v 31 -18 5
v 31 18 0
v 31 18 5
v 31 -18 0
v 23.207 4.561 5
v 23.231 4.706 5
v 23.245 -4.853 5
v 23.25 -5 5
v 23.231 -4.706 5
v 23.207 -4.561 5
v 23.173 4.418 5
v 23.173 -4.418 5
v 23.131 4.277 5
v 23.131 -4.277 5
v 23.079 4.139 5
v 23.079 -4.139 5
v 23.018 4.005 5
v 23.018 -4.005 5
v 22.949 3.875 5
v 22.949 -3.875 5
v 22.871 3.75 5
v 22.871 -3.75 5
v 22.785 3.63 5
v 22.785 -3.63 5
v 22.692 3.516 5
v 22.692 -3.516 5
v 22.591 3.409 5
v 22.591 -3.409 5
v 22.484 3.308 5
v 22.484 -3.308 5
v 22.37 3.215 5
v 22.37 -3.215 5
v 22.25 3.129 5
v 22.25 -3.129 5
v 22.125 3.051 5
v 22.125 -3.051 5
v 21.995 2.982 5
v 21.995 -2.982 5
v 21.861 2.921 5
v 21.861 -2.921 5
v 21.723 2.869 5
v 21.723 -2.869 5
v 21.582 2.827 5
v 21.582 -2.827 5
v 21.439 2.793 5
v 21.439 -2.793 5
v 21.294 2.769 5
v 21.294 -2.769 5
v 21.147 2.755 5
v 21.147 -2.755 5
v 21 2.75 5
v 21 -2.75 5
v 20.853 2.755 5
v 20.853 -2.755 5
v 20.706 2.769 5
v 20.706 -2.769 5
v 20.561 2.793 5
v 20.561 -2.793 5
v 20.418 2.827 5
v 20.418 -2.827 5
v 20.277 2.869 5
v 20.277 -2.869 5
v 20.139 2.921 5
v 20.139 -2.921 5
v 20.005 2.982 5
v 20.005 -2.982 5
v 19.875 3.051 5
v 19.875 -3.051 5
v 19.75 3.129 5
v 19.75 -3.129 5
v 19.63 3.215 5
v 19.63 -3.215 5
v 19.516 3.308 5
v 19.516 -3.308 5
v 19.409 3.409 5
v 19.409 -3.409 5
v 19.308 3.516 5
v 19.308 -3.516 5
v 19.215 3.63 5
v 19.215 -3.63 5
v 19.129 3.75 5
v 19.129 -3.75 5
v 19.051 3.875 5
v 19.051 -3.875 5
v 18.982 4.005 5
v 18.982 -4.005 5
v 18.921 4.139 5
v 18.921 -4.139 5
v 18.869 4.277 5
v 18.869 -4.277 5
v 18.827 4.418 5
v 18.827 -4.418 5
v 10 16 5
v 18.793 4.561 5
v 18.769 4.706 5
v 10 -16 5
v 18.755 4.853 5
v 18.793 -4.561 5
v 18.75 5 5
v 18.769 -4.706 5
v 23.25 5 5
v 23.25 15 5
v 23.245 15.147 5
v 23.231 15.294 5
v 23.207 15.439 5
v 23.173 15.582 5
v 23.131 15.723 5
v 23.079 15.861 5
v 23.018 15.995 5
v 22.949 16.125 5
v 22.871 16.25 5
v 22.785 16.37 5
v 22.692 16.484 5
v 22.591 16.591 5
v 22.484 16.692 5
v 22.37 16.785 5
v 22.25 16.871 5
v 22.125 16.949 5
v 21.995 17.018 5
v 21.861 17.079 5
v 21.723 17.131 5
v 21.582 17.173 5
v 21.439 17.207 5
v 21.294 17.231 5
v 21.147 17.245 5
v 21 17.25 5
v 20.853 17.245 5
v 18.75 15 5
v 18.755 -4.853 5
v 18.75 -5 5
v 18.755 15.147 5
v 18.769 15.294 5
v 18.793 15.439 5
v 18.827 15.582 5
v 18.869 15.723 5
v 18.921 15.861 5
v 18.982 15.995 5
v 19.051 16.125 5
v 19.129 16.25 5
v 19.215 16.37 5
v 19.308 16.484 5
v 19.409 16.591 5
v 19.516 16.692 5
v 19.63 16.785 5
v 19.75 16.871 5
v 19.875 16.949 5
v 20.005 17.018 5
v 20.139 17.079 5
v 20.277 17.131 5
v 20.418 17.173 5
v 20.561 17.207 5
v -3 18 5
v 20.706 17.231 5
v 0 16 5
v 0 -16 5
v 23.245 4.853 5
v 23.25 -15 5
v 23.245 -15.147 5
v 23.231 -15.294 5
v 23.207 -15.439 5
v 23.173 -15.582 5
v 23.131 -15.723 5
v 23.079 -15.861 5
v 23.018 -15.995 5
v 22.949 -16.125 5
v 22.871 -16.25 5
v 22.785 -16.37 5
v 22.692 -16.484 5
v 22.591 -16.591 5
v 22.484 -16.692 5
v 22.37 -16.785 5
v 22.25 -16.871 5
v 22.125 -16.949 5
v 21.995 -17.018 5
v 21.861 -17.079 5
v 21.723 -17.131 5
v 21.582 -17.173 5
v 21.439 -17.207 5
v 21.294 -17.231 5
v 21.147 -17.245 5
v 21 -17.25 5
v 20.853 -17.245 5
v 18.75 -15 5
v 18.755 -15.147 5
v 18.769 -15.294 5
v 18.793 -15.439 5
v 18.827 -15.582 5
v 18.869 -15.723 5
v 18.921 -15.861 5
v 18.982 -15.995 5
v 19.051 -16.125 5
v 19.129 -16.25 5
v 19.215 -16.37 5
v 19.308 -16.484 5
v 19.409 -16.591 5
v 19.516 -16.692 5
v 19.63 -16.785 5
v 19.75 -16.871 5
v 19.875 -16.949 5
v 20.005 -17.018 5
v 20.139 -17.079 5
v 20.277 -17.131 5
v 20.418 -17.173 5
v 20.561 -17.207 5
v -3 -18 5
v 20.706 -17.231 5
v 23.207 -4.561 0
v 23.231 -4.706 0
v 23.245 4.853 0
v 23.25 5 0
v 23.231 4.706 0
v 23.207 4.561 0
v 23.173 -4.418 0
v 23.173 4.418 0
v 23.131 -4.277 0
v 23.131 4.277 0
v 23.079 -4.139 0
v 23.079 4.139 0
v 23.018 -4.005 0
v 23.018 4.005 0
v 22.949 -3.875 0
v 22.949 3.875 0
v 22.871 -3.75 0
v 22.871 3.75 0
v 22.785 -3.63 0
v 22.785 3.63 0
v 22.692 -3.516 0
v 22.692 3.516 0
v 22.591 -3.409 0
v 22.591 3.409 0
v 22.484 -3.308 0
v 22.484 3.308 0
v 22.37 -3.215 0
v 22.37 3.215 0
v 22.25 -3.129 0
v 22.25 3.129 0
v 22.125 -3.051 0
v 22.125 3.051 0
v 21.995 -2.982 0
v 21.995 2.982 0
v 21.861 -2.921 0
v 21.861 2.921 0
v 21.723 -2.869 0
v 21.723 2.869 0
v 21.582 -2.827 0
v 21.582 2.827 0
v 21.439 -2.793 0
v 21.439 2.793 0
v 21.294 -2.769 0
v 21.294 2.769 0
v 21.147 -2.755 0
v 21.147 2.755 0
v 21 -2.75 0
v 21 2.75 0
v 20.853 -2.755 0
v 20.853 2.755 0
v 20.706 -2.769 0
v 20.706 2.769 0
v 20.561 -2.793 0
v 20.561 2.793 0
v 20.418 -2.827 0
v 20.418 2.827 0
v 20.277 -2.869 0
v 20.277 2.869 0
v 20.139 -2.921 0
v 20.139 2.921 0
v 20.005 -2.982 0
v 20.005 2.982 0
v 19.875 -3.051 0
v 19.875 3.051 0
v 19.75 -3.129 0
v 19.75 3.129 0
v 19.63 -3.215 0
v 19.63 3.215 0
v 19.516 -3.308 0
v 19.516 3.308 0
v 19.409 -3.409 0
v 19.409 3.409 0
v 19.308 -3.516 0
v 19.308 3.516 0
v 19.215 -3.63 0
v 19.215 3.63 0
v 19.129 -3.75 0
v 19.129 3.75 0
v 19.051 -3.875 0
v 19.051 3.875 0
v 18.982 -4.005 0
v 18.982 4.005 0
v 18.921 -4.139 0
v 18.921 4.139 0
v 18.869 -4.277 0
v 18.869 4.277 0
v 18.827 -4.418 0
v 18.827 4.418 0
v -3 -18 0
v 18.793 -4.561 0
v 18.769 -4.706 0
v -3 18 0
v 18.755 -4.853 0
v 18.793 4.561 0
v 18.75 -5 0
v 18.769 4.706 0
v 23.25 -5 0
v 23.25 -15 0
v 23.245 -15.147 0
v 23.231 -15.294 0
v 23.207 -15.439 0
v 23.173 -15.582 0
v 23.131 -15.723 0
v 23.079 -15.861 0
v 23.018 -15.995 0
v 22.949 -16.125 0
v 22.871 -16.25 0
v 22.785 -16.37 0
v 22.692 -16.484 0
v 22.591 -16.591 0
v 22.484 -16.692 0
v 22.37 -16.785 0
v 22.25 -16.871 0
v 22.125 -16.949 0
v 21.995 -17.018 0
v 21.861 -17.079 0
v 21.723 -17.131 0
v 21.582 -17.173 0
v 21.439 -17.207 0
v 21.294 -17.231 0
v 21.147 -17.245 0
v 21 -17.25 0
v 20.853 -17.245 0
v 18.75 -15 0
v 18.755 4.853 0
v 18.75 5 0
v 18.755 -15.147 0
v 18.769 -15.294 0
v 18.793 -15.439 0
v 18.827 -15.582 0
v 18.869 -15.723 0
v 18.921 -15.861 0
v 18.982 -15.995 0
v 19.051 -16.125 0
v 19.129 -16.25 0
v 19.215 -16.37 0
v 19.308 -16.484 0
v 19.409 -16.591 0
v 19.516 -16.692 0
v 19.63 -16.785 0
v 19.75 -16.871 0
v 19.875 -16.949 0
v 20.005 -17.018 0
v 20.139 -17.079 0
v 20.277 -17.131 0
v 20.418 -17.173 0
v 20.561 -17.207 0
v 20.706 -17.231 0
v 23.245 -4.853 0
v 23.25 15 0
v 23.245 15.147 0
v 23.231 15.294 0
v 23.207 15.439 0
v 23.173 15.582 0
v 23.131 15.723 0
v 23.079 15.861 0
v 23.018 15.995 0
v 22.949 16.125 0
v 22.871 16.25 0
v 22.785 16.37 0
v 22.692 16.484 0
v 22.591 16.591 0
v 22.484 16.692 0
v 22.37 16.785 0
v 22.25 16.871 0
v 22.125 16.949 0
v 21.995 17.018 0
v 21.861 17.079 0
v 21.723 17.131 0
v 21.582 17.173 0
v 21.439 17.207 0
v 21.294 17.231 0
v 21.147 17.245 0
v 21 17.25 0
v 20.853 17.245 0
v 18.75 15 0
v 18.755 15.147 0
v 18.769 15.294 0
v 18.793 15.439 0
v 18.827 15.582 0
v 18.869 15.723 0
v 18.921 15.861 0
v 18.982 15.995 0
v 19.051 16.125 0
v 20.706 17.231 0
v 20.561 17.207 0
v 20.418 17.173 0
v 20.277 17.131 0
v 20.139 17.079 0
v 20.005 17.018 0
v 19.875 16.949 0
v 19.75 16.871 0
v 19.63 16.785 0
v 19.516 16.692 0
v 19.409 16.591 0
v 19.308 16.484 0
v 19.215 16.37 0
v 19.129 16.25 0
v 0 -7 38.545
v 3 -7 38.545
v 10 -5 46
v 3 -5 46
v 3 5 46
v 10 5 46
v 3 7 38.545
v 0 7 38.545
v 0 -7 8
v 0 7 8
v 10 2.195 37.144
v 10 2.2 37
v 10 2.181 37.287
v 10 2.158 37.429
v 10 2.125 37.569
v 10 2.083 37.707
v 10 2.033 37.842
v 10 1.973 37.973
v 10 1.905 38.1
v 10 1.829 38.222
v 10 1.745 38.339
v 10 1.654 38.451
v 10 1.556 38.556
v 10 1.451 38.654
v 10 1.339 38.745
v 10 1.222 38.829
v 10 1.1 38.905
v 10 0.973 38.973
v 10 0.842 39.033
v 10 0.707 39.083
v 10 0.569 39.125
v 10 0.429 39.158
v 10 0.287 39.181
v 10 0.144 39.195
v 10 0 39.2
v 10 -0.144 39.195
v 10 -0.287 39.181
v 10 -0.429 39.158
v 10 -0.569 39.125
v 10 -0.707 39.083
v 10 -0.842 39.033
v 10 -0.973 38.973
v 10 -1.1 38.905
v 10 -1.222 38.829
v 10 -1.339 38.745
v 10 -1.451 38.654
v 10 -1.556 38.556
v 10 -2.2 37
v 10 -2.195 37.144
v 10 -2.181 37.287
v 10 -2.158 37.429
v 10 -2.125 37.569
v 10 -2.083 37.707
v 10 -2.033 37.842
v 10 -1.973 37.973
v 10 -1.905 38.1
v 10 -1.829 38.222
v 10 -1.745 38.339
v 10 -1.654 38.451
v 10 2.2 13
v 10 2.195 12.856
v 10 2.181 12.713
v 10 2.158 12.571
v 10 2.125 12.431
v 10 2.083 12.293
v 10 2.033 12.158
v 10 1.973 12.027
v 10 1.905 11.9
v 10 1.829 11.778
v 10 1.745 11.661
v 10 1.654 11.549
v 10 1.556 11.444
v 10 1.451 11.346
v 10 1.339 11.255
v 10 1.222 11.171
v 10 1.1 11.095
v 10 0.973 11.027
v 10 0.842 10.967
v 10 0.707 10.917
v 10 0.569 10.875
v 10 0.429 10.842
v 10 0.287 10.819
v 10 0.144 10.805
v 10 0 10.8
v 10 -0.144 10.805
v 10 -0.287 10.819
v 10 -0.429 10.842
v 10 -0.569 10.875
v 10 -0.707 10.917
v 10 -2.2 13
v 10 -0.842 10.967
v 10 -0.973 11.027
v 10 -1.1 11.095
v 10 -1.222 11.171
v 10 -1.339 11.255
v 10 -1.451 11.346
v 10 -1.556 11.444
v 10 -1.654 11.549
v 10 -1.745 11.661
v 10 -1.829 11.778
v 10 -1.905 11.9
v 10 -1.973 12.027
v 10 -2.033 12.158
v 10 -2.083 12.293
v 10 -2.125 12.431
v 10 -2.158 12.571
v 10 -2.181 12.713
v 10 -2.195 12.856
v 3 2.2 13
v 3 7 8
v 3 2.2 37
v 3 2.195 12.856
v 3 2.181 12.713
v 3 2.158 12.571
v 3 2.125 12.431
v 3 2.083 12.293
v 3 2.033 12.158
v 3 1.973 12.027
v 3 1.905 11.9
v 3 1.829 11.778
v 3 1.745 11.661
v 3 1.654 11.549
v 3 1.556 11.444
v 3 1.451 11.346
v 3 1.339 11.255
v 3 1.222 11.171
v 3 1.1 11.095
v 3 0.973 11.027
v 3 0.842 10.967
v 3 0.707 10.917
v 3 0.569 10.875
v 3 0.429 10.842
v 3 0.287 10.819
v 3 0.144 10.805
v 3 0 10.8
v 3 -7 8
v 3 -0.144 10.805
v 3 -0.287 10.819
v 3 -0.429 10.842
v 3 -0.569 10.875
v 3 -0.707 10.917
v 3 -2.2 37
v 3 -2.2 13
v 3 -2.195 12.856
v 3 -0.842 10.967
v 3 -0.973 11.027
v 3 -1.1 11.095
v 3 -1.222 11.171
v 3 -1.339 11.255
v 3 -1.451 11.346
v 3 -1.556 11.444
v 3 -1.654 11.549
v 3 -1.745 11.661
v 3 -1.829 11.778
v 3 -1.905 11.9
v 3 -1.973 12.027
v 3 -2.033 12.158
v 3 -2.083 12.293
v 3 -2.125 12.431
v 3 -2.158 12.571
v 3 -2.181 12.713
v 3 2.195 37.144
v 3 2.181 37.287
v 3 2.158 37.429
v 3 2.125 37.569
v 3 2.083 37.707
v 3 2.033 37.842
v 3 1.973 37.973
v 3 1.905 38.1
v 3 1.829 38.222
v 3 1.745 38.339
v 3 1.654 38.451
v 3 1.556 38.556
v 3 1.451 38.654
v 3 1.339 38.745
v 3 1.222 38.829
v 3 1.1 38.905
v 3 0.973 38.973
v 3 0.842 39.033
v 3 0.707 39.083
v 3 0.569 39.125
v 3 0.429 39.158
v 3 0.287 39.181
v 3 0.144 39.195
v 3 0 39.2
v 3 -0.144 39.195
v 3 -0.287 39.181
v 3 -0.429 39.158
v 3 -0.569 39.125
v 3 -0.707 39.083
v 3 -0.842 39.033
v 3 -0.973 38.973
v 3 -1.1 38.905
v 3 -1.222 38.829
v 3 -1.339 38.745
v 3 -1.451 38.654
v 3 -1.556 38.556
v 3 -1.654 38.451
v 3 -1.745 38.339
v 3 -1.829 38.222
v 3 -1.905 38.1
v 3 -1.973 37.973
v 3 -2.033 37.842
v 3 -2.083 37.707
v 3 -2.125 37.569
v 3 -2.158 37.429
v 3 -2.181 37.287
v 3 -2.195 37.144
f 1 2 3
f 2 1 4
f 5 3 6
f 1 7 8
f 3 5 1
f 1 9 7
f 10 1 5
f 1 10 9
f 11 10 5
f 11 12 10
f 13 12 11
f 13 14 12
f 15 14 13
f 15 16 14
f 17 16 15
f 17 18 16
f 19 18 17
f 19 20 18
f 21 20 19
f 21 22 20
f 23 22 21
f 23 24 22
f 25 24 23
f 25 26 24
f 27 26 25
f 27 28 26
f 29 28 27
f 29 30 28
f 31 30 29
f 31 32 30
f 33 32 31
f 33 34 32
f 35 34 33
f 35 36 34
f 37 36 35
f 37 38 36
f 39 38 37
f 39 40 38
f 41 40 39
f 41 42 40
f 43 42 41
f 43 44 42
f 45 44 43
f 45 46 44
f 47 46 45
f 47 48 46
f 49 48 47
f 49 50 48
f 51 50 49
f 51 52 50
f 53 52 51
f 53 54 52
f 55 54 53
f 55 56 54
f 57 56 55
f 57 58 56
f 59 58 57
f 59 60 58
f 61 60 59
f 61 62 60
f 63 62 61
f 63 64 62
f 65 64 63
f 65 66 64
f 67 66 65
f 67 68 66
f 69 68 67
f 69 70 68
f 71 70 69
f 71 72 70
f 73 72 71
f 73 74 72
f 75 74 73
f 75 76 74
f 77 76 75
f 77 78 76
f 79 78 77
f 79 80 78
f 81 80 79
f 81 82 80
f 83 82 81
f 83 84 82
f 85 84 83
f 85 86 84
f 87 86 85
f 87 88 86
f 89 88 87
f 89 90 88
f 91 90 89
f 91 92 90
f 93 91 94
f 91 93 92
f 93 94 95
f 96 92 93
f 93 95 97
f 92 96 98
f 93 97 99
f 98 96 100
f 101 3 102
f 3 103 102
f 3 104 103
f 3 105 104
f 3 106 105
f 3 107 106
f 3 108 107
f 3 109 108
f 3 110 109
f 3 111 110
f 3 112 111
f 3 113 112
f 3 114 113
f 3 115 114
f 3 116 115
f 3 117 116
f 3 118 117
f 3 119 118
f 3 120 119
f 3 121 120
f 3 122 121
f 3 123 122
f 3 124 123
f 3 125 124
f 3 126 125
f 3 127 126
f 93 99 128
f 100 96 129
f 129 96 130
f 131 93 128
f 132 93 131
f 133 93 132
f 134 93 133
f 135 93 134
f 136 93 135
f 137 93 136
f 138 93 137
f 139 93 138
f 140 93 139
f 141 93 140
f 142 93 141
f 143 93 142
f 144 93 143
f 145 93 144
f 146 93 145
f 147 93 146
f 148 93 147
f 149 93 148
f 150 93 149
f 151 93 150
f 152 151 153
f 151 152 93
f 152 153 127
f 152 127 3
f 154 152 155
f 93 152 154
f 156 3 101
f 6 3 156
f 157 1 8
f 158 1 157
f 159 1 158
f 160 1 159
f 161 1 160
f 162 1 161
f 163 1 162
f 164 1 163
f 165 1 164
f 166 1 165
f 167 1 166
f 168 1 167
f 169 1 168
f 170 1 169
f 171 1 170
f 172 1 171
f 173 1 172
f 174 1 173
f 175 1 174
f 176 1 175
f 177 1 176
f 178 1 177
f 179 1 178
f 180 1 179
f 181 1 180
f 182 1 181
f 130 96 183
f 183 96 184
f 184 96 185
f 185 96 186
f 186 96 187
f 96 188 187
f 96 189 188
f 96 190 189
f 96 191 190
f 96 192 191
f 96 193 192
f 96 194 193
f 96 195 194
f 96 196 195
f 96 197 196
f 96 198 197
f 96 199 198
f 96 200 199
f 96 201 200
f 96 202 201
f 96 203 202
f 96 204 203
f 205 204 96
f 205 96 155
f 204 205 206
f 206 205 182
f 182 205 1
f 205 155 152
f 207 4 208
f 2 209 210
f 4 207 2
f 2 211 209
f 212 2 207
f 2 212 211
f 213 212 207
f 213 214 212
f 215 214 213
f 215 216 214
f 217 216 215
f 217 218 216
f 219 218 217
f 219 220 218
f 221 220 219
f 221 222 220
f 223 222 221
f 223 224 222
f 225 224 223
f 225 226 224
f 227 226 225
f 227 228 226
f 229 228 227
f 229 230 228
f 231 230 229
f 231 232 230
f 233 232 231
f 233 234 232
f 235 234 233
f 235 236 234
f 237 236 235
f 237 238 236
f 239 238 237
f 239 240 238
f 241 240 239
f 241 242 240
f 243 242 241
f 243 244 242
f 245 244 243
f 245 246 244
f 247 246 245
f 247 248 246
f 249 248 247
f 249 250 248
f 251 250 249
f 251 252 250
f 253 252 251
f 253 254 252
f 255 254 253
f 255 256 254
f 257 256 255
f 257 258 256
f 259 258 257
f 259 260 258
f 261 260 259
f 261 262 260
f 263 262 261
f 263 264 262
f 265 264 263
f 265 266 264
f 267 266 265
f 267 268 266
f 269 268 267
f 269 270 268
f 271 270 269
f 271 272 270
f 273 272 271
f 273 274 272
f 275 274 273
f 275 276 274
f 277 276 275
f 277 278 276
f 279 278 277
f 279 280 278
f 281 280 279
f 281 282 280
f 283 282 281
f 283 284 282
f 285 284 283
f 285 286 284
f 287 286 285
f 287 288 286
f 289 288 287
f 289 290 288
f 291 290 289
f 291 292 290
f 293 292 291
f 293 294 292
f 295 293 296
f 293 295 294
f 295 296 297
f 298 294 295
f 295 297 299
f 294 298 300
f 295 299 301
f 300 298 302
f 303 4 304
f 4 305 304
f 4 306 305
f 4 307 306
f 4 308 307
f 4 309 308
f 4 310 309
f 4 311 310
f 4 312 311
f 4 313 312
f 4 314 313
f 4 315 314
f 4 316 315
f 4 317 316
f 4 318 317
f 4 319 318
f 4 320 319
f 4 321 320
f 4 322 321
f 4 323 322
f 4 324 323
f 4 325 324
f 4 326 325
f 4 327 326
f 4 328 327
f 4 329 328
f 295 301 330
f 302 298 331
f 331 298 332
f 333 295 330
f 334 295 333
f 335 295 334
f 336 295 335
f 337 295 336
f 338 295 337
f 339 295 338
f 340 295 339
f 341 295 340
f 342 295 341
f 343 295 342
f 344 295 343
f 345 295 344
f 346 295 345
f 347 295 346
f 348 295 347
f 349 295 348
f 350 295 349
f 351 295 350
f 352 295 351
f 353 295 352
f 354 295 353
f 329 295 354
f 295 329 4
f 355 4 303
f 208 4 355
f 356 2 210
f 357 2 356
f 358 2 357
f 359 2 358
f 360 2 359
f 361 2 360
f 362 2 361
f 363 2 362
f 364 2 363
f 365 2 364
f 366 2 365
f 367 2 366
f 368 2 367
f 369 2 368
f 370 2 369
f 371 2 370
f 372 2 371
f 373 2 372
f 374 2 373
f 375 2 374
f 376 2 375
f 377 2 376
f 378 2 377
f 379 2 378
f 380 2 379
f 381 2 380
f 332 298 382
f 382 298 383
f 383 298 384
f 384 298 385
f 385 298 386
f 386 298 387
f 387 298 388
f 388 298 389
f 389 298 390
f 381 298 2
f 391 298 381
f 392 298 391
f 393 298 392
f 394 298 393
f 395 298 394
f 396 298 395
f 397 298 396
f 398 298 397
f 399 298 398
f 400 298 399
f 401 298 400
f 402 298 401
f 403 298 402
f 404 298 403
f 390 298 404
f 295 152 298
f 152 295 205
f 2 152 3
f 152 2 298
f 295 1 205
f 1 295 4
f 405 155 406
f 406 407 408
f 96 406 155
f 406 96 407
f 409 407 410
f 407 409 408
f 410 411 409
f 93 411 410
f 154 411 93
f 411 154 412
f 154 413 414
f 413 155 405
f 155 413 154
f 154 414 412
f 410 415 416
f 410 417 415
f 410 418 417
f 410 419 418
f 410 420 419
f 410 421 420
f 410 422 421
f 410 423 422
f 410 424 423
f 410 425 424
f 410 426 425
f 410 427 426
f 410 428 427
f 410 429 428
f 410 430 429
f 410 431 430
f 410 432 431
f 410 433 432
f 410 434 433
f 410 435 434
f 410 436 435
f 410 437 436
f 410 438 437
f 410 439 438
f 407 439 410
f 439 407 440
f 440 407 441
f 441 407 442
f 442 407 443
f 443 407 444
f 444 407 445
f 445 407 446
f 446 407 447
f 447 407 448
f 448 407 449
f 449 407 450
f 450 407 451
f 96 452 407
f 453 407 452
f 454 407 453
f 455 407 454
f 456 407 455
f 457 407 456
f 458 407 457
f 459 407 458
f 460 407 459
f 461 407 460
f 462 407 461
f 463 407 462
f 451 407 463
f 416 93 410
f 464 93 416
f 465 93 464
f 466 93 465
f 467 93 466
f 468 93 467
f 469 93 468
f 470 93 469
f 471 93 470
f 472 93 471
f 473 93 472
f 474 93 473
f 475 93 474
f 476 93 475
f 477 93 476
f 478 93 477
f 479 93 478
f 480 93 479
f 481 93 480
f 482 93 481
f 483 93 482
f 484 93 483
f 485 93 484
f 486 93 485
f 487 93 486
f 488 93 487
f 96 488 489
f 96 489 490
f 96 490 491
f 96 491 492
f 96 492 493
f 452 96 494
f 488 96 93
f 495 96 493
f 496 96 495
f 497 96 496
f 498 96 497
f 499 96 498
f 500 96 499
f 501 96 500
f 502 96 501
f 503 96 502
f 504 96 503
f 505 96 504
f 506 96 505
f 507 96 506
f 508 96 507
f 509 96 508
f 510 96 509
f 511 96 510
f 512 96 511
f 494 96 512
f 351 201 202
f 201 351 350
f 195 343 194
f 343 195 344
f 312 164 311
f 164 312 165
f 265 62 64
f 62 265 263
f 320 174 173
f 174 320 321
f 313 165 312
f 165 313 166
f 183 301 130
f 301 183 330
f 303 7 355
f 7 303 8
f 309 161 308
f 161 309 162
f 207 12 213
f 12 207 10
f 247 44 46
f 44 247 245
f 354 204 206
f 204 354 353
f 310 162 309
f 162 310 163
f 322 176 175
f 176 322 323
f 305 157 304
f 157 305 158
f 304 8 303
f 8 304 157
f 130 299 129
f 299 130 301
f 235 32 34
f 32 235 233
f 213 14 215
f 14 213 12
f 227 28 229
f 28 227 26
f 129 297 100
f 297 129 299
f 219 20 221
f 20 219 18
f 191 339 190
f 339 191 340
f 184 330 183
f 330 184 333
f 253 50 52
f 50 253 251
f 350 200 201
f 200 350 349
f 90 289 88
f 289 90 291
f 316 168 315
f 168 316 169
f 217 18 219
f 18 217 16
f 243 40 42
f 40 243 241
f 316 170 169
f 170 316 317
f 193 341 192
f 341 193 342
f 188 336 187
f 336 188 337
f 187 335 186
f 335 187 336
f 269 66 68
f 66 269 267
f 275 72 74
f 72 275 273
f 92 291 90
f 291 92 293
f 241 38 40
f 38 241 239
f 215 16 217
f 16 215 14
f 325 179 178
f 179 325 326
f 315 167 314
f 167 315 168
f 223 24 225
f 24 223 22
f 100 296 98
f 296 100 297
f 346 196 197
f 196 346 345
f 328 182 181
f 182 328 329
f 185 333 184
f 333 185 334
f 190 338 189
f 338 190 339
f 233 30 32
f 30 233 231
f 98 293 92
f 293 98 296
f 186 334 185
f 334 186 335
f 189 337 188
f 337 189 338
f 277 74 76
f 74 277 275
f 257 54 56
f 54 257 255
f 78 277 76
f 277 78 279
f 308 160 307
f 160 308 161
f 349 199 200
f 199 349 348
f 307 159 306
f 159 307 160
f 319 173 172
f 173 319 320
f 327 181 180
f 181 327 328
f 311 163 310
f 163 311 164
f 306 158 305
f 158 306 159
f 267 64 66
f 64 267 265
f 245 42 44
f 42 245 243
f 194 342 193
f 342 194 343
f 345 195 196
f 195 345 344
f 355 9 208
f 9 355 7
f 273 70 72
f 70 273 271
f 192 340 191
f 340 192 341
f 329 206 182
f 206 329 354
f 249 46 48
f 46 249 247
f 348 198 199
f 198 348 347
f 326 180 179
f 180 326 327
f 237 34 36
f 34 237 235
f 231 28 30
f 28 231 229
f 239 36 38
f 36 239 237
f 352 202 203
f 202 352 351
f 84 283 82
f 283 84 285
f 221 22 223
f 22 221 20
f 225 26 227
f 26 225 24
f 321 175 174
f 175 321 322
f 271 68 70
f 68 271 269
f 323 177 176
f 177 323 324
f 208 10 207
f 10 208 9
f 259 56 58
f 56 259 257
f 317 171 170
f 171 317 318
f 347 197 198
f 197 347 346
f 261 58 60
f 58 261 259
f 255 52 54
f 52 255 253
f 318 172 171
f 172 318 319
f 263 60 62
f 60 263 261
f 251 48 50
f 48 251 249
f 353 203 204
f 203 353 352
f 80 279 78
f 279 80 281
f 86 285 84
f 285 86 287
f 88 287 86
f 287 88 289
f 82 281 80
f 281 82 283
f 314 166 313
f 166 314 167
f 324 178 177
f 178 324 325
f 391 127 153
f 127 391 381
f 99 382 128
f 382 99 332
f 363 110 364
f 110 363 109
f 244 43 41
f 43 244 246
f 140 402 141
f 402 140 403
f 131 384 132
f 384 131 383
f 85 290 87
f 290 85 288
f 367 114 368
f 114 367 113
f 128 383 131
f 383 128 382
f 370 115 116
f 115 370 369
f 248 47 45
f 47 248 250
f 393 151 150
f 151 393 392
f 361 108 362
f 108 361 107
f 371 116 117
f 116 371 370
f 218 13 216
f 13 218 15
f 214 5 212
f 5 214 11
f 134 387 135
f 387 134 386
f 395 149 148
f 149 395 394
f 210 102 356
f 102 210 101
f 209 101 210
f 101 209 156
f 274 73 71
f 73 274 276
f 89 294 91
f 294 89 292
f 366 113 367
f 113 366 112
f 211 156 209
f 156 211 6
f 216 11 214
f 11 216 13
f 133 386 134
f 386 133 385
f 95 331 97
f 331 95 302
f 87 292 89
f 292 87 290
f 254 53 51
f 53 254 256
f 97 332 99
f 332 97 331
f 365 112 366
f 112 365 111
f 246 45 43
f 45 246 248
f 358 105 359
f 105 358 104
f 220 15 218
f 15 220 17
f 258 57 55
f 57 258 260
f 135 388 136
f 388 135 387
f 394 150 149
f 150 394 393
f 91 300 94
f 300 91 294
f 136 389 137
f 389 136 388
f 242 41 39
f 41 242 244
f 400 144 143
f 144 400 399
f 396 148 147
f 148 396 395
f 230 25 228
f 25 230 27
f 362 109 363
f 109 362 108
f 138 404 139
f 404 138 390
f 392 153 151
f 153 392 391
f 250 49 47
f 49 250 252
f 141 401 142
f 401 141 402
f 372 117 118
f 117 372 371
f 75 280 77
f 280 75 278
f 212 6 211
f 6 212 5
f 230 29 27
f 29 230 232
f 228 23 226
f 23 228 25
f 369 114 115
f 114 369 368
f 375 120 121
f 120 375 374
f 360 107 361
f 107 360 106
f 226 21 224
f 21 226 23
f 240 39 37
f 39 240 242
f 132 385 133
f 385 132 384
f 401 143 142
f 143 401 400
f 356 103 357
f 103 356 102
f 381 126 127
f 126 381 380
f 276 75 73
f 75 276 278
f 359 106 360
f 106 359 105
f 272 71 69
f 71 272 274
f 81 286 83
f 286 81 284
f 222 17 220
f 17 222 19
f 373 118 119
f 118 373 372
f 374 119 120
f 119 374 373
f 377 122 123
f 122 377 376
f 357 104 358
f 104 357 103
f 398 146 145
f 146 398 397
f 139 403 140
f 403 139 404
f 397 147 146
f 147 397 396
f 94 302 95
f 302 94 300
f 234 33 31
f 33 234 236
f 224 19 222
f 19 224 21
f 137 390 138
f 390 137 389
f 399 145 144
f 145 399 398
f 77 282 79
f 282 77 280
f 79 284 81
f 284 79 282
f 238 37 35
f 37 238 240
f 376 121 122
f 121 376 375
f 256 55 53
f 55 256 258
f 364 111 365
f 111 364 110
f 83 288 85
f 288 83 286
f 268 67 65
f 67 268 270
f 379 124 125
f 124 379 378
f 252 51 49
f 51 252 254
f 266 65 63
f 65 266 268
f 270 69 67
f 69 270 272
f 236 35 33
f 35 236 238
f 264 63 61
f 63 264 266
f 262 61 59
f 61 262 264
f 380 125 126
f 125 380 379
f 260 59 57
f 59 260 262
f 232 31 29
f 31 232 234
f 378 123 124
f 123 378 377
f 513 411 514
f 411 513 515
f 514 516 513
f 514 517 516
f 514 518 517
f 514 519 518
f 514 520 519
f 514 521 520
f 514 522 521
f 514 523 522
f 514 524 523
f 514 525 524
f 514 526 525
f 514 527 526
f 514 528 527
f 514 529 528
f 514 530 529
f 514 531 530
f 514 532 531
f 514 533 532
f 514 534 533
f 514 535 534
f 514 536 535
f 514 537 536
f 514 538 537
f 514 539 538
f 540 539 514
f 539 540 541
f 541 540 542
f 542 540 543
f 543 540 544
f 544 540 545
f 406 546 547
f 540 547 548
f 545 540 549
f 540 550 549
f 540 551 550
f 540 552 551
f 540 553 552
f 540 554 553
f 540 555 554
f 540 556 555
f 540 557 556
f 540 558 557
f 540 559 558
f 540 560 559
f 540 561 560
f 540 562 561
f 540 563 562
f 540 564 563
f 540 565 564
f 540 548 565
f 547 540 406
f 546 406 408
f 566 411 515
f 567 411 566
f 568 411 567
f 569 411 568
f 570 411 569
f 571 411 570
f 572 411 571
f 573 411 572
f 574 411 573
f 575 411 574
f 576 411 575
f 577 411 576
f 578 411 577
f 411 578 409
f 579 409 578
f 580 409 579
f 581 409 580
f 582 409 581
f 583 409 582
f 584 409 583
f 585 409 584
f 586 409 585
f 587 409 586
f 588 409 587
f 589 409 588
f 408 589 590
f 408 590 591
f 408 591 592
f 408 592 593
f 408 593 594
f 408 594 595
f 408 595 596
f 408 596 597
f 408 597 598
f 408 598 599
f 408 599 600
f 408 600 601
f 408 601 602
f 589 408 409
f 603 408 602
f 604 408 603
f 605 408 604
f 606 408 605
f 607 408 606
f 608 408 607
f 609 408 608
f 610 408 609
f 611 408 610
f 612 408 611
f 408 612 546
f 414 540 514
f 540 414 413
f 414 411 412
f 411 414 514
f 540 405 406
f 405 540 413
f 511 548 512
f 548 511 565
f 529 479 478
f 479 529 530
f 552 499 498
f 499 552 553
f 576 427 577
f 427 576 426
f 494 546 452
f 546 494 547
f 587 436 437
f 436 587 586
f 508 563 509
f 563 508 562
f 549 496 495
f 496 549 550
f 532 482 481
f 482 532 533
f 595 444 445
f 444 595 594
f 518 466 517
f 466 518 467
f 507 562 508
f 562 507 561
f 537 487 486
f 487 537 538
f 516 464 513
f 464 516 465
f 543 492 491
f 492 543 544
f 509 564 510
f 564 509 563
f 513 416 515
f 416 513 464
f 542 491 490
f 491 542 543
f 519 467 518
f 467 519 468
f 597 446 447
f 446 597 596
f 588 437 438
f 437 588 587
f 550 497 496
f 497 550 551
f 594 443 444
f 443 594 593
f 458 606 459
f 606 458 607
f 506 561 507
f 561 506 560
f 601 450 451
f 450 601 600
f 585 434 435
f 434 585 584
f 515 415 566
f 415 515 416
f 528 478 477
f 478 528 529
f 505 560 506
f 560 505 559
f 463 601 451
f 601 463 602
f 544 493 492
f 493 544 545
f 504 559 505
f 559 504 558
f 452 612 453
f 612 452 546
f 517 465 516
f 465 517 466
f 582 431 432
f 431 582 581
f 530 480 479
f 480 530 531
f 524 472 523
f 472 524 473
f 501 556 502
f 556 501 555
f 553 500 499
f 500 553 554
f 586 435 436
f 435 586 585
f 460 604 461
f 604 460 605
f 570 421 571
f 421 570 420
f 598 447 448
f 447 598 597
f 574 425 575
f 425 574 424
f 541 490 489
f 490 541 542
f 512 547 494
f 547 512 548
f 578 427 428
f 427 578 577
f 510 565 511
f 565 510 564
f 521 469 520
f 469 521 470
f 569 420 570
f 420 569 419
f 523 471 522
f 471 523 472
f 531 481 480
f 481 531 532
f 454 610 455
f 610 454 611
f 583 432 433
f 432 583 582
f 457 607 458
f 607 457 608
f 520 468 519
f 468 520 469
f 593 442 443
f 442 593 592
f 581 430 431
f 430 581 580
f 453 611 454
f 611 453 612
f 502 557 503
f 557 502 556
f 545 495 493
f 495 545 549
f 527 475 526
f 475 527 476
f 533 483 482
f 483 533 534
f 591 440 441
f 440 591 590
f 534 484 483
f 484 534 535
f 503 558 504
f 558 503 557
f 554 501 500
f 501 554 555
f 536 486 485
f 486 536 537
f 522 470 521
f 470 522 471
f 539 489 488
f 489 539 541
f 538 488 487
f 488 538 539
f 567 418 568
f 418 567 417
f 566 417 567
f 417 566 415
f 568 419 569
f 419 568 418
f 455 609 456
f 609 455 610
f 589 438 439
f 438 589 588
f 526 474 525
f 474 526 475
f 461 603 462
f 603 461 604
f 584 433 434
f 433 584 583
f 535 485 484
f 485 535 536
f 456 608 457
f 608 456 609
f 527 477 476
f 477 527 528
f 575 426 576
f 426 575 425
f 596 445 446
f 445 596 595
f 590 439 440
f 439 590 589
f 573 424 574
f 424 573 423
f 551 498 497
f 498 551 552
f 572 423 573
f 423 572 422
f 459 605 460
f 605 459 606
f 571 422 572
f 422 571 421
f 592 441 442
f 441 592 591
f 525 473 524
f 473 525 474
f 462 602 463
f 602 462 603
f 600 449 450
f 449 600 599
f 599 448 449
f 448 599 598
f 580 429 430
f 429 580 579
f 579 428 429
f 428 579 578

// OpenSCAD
// ==============================================================
//   CABLE HOUSING STOP  —  for the twin-cable brake drum
//
//   Anchors the outer brake housing to the aluminum plate so the
//   inner wire can actually be pulled. Without these the housing
//   just compresses and the drum does nothing.
//
//   TWO PIECES, printed TWICE each (one pair per cable):
//     POST  - bolts to the plate, vertical groove + clamp slot
//     BLOCK - the cable stop itself, slides up/down the post
//
//   The housing pushes the stop TOWARDS the drum with ~66 N.
//   That load goes into the tongue bearing on the groove wall,
//   NOT into the clamp bolt — so a single M4 is enough.
// ==============================================================

PART = "post";     // "post" | "block" | "assembly" (preview only)

/* ---------------- cable ---------------- */
HOUSING_D = 6.4;   // ferrule / housing end OD  (5 mm housing + cap)
WIRE_D    = 2.8;   // inner wire clearance
SEAT_L    = 11;    // how deep the ferrule sits

/* ---------------- hardware ---------------- */
M4        = 4.4;   // clamp bolt clearance
M4_HEAD   = 7.6;   // socket head counterbore
PLATE_M4  = 4.5;   // slots for the two screws into the plate

/* ---------------- post ---------------- */
POST_T    = 10;    // slab thickness
POST_H    = 46;    // total height
BASE_Y    = 32;    // depth at the foot
TOP_Y     = 10;    // depth at the top
FOOT_T    = 5;
FOOT_X0   = -3;
FOOT_X1   = 31;
FOOT_Y    = 36;
SCREW_X   = 21;    // plate screws, clear of the post and of a M4 washer

GROOVE_W  = 14;    // anti-rotation groove, width (Y)
GROOVE_D  = 3;     // ...and depth (X)
SLOT_Z0   = 13;    // clamp slot travel
SLOT_Z1   = 37;

/* ---------------- block ---------------- */
BLK_X     = 16;
BLK_Y     = 16;
BLK_Z     = 20;
CABLE_X   = -8;    // cable axis, out from the post face
CABLE_Z   =  3;    // ...and up from the block centre
BOLT_Z    = -5;    // clamp bolt, safely below the cable channel
TONGUE_CL = 0.3;   // sliding clearance

$fn = 96;

/* ================= derived ================= */
// cable height above the plate = FOOT_T + bolt position + (CABLE_Z - BOLT_Z)
CAB_MIN = FOOT_T + SLOT_Z0 + (CABLE_Z-BOLT_Z) - FOOT_T;
echo(str(">> cable height adjustable from ", SLOT_Z0 + (CABLE_Z-BOLT_Z),
         " to ", SLOT_Z1 + (CABLE_Z-BOLT_Z), " mm above the plate"));
echo(str(">> post footprint ", FOOT_X1-FOOT_X0, " x ", FOOT_Y, " mm"));

/* ================= POST ================= */
module post(){
    difference(){
        union(){
            // foot
            translate([FOOT_X0, -FOOT_Y/2, 0]) cube([FOOT_X1-FOOT_X0, FOOT_Y, FOOT_T]);
            // tapered slab. Constant 10 mm in X, so the BACK face stays
            // flat and vertical — the clamp nut needs somewhere square to sit.
            hull(){
                translate([0, -BASE_Y/2, FOOT_T-1]) cube([POST_T, BASE_Y, 1]);
                translate([0, -TOP_Y/2,  POST_H-1]) cube([POST_T, TOP_Y,  1]);
            }
        }

        // anti-rotation groove, open at the top so the block slides in
        translate([-1, -GROOVE_W/2, FOOT_T+3])
            cube([GROOVE_D+1, GROOVE_W, POST_H]);

        // clamp slot
        hull(){
            translate([GROOVE_D-1, 0, SLOT_Z0]) rotate([0,90,0]) cylinder(d=M4, h=POST_T+2);
            translate([GROOVE_D-1, 0, SLOT_Z1]) rotate([0,90,0]) cylinder(d=M4, h=POST_T+2);
        }

        // plate screw slots — slotted along Y so you can slide the whole
        // bracket toward or away from the drum to set cable tension
        for(s=[-1,1])
            hull(){
                translate([SCREW_X, s*15, -1]) cylinder(d=PLATE_M4, h=FOOT_T+2);
                translate([SCREW_X, s*5,  -1]) cylinder(d=PLATE_M4, h=FOOT_T+2);
            }
    }
}

/* ================= BLOCK ================= */
module block(){
    difference(){
        union(){
            translate([-BLK_X, -BLK_Y/2, -BLK_Z/2]) cube([BLK_X, BLK_Y, BLK_Z]);
            // tongue — this is what actually carries the 66 N
            translate([0, -(GROOVE_W-2*TONGUE_CL)/2, -BLK_Z/2])
                cube([GROOVE_D-TONGUE_CL, GROOVE_W-2*TONGUE_CL, 15]);
        }

        // --- cable channel, along Y ---
        // wire side (faces the drum)
        translate([CABLE_X, -BLK_Y/2-1, CABLE_Z]) rotate([-90,0,0])
            cylinder(d=WIRE_D, h=BLK_Y/2+1-(SEAT_L-BLK_Y/2)+0.01);
        // ferrule seat (housing butts on the shoulder)
        translate([CABLE_X, BLK_Y/2-SEAT_L, CABLE_Z]) rotate([-90,0,0])
            cylinder(d=HOUSING_D, h=SEAT_L+1);

        // open the whole channel upward so the cable drops in from above
        translate([CABLE_X-WIRE_D/2, -BLK_Y/2-1, CABLE_Z])
            cube([WIRE_D, BLK_Y-SEAT_L+1, BLK_Z]);
        translate([CABLE_X-HOUSING_D/2, BLK_Y/2-SEAT_L, CABLE_Z])
            cube([HOUSING_D, SEAT_L+1, BLK_Z]);

        // --- clamp bolt, below the cable ---
        translate([-BLK_X-1, 0, BOLT_Z]) rotate([0,90,0]) cylinder(d=M4, h=BLK_X+GROOVE_D+2);
        translate([-BLK_X-1, 0, BOLT_Z]) rotate([0,90,0]) cylinder(d=M4_HEAD, h=5);
    }
}

/* ================= preview ================= */
module assembly(){
    post();
    translate([0,0,25]) block();
}

// everything you need for BOTH cables, on one bed
module plate(){
    translate([  0,  0, 0]) post();
    translate([ 52,  0, 0]) post();
    translate([  6, 48, BLK_Z/2]) block();
    translate([ 34, 48, BLK_Z/2]) block();
}

if     (PART == "post")  post();
else if(PART == "block") block();
else if(PART == "plate") plate();
else                     assembly();
